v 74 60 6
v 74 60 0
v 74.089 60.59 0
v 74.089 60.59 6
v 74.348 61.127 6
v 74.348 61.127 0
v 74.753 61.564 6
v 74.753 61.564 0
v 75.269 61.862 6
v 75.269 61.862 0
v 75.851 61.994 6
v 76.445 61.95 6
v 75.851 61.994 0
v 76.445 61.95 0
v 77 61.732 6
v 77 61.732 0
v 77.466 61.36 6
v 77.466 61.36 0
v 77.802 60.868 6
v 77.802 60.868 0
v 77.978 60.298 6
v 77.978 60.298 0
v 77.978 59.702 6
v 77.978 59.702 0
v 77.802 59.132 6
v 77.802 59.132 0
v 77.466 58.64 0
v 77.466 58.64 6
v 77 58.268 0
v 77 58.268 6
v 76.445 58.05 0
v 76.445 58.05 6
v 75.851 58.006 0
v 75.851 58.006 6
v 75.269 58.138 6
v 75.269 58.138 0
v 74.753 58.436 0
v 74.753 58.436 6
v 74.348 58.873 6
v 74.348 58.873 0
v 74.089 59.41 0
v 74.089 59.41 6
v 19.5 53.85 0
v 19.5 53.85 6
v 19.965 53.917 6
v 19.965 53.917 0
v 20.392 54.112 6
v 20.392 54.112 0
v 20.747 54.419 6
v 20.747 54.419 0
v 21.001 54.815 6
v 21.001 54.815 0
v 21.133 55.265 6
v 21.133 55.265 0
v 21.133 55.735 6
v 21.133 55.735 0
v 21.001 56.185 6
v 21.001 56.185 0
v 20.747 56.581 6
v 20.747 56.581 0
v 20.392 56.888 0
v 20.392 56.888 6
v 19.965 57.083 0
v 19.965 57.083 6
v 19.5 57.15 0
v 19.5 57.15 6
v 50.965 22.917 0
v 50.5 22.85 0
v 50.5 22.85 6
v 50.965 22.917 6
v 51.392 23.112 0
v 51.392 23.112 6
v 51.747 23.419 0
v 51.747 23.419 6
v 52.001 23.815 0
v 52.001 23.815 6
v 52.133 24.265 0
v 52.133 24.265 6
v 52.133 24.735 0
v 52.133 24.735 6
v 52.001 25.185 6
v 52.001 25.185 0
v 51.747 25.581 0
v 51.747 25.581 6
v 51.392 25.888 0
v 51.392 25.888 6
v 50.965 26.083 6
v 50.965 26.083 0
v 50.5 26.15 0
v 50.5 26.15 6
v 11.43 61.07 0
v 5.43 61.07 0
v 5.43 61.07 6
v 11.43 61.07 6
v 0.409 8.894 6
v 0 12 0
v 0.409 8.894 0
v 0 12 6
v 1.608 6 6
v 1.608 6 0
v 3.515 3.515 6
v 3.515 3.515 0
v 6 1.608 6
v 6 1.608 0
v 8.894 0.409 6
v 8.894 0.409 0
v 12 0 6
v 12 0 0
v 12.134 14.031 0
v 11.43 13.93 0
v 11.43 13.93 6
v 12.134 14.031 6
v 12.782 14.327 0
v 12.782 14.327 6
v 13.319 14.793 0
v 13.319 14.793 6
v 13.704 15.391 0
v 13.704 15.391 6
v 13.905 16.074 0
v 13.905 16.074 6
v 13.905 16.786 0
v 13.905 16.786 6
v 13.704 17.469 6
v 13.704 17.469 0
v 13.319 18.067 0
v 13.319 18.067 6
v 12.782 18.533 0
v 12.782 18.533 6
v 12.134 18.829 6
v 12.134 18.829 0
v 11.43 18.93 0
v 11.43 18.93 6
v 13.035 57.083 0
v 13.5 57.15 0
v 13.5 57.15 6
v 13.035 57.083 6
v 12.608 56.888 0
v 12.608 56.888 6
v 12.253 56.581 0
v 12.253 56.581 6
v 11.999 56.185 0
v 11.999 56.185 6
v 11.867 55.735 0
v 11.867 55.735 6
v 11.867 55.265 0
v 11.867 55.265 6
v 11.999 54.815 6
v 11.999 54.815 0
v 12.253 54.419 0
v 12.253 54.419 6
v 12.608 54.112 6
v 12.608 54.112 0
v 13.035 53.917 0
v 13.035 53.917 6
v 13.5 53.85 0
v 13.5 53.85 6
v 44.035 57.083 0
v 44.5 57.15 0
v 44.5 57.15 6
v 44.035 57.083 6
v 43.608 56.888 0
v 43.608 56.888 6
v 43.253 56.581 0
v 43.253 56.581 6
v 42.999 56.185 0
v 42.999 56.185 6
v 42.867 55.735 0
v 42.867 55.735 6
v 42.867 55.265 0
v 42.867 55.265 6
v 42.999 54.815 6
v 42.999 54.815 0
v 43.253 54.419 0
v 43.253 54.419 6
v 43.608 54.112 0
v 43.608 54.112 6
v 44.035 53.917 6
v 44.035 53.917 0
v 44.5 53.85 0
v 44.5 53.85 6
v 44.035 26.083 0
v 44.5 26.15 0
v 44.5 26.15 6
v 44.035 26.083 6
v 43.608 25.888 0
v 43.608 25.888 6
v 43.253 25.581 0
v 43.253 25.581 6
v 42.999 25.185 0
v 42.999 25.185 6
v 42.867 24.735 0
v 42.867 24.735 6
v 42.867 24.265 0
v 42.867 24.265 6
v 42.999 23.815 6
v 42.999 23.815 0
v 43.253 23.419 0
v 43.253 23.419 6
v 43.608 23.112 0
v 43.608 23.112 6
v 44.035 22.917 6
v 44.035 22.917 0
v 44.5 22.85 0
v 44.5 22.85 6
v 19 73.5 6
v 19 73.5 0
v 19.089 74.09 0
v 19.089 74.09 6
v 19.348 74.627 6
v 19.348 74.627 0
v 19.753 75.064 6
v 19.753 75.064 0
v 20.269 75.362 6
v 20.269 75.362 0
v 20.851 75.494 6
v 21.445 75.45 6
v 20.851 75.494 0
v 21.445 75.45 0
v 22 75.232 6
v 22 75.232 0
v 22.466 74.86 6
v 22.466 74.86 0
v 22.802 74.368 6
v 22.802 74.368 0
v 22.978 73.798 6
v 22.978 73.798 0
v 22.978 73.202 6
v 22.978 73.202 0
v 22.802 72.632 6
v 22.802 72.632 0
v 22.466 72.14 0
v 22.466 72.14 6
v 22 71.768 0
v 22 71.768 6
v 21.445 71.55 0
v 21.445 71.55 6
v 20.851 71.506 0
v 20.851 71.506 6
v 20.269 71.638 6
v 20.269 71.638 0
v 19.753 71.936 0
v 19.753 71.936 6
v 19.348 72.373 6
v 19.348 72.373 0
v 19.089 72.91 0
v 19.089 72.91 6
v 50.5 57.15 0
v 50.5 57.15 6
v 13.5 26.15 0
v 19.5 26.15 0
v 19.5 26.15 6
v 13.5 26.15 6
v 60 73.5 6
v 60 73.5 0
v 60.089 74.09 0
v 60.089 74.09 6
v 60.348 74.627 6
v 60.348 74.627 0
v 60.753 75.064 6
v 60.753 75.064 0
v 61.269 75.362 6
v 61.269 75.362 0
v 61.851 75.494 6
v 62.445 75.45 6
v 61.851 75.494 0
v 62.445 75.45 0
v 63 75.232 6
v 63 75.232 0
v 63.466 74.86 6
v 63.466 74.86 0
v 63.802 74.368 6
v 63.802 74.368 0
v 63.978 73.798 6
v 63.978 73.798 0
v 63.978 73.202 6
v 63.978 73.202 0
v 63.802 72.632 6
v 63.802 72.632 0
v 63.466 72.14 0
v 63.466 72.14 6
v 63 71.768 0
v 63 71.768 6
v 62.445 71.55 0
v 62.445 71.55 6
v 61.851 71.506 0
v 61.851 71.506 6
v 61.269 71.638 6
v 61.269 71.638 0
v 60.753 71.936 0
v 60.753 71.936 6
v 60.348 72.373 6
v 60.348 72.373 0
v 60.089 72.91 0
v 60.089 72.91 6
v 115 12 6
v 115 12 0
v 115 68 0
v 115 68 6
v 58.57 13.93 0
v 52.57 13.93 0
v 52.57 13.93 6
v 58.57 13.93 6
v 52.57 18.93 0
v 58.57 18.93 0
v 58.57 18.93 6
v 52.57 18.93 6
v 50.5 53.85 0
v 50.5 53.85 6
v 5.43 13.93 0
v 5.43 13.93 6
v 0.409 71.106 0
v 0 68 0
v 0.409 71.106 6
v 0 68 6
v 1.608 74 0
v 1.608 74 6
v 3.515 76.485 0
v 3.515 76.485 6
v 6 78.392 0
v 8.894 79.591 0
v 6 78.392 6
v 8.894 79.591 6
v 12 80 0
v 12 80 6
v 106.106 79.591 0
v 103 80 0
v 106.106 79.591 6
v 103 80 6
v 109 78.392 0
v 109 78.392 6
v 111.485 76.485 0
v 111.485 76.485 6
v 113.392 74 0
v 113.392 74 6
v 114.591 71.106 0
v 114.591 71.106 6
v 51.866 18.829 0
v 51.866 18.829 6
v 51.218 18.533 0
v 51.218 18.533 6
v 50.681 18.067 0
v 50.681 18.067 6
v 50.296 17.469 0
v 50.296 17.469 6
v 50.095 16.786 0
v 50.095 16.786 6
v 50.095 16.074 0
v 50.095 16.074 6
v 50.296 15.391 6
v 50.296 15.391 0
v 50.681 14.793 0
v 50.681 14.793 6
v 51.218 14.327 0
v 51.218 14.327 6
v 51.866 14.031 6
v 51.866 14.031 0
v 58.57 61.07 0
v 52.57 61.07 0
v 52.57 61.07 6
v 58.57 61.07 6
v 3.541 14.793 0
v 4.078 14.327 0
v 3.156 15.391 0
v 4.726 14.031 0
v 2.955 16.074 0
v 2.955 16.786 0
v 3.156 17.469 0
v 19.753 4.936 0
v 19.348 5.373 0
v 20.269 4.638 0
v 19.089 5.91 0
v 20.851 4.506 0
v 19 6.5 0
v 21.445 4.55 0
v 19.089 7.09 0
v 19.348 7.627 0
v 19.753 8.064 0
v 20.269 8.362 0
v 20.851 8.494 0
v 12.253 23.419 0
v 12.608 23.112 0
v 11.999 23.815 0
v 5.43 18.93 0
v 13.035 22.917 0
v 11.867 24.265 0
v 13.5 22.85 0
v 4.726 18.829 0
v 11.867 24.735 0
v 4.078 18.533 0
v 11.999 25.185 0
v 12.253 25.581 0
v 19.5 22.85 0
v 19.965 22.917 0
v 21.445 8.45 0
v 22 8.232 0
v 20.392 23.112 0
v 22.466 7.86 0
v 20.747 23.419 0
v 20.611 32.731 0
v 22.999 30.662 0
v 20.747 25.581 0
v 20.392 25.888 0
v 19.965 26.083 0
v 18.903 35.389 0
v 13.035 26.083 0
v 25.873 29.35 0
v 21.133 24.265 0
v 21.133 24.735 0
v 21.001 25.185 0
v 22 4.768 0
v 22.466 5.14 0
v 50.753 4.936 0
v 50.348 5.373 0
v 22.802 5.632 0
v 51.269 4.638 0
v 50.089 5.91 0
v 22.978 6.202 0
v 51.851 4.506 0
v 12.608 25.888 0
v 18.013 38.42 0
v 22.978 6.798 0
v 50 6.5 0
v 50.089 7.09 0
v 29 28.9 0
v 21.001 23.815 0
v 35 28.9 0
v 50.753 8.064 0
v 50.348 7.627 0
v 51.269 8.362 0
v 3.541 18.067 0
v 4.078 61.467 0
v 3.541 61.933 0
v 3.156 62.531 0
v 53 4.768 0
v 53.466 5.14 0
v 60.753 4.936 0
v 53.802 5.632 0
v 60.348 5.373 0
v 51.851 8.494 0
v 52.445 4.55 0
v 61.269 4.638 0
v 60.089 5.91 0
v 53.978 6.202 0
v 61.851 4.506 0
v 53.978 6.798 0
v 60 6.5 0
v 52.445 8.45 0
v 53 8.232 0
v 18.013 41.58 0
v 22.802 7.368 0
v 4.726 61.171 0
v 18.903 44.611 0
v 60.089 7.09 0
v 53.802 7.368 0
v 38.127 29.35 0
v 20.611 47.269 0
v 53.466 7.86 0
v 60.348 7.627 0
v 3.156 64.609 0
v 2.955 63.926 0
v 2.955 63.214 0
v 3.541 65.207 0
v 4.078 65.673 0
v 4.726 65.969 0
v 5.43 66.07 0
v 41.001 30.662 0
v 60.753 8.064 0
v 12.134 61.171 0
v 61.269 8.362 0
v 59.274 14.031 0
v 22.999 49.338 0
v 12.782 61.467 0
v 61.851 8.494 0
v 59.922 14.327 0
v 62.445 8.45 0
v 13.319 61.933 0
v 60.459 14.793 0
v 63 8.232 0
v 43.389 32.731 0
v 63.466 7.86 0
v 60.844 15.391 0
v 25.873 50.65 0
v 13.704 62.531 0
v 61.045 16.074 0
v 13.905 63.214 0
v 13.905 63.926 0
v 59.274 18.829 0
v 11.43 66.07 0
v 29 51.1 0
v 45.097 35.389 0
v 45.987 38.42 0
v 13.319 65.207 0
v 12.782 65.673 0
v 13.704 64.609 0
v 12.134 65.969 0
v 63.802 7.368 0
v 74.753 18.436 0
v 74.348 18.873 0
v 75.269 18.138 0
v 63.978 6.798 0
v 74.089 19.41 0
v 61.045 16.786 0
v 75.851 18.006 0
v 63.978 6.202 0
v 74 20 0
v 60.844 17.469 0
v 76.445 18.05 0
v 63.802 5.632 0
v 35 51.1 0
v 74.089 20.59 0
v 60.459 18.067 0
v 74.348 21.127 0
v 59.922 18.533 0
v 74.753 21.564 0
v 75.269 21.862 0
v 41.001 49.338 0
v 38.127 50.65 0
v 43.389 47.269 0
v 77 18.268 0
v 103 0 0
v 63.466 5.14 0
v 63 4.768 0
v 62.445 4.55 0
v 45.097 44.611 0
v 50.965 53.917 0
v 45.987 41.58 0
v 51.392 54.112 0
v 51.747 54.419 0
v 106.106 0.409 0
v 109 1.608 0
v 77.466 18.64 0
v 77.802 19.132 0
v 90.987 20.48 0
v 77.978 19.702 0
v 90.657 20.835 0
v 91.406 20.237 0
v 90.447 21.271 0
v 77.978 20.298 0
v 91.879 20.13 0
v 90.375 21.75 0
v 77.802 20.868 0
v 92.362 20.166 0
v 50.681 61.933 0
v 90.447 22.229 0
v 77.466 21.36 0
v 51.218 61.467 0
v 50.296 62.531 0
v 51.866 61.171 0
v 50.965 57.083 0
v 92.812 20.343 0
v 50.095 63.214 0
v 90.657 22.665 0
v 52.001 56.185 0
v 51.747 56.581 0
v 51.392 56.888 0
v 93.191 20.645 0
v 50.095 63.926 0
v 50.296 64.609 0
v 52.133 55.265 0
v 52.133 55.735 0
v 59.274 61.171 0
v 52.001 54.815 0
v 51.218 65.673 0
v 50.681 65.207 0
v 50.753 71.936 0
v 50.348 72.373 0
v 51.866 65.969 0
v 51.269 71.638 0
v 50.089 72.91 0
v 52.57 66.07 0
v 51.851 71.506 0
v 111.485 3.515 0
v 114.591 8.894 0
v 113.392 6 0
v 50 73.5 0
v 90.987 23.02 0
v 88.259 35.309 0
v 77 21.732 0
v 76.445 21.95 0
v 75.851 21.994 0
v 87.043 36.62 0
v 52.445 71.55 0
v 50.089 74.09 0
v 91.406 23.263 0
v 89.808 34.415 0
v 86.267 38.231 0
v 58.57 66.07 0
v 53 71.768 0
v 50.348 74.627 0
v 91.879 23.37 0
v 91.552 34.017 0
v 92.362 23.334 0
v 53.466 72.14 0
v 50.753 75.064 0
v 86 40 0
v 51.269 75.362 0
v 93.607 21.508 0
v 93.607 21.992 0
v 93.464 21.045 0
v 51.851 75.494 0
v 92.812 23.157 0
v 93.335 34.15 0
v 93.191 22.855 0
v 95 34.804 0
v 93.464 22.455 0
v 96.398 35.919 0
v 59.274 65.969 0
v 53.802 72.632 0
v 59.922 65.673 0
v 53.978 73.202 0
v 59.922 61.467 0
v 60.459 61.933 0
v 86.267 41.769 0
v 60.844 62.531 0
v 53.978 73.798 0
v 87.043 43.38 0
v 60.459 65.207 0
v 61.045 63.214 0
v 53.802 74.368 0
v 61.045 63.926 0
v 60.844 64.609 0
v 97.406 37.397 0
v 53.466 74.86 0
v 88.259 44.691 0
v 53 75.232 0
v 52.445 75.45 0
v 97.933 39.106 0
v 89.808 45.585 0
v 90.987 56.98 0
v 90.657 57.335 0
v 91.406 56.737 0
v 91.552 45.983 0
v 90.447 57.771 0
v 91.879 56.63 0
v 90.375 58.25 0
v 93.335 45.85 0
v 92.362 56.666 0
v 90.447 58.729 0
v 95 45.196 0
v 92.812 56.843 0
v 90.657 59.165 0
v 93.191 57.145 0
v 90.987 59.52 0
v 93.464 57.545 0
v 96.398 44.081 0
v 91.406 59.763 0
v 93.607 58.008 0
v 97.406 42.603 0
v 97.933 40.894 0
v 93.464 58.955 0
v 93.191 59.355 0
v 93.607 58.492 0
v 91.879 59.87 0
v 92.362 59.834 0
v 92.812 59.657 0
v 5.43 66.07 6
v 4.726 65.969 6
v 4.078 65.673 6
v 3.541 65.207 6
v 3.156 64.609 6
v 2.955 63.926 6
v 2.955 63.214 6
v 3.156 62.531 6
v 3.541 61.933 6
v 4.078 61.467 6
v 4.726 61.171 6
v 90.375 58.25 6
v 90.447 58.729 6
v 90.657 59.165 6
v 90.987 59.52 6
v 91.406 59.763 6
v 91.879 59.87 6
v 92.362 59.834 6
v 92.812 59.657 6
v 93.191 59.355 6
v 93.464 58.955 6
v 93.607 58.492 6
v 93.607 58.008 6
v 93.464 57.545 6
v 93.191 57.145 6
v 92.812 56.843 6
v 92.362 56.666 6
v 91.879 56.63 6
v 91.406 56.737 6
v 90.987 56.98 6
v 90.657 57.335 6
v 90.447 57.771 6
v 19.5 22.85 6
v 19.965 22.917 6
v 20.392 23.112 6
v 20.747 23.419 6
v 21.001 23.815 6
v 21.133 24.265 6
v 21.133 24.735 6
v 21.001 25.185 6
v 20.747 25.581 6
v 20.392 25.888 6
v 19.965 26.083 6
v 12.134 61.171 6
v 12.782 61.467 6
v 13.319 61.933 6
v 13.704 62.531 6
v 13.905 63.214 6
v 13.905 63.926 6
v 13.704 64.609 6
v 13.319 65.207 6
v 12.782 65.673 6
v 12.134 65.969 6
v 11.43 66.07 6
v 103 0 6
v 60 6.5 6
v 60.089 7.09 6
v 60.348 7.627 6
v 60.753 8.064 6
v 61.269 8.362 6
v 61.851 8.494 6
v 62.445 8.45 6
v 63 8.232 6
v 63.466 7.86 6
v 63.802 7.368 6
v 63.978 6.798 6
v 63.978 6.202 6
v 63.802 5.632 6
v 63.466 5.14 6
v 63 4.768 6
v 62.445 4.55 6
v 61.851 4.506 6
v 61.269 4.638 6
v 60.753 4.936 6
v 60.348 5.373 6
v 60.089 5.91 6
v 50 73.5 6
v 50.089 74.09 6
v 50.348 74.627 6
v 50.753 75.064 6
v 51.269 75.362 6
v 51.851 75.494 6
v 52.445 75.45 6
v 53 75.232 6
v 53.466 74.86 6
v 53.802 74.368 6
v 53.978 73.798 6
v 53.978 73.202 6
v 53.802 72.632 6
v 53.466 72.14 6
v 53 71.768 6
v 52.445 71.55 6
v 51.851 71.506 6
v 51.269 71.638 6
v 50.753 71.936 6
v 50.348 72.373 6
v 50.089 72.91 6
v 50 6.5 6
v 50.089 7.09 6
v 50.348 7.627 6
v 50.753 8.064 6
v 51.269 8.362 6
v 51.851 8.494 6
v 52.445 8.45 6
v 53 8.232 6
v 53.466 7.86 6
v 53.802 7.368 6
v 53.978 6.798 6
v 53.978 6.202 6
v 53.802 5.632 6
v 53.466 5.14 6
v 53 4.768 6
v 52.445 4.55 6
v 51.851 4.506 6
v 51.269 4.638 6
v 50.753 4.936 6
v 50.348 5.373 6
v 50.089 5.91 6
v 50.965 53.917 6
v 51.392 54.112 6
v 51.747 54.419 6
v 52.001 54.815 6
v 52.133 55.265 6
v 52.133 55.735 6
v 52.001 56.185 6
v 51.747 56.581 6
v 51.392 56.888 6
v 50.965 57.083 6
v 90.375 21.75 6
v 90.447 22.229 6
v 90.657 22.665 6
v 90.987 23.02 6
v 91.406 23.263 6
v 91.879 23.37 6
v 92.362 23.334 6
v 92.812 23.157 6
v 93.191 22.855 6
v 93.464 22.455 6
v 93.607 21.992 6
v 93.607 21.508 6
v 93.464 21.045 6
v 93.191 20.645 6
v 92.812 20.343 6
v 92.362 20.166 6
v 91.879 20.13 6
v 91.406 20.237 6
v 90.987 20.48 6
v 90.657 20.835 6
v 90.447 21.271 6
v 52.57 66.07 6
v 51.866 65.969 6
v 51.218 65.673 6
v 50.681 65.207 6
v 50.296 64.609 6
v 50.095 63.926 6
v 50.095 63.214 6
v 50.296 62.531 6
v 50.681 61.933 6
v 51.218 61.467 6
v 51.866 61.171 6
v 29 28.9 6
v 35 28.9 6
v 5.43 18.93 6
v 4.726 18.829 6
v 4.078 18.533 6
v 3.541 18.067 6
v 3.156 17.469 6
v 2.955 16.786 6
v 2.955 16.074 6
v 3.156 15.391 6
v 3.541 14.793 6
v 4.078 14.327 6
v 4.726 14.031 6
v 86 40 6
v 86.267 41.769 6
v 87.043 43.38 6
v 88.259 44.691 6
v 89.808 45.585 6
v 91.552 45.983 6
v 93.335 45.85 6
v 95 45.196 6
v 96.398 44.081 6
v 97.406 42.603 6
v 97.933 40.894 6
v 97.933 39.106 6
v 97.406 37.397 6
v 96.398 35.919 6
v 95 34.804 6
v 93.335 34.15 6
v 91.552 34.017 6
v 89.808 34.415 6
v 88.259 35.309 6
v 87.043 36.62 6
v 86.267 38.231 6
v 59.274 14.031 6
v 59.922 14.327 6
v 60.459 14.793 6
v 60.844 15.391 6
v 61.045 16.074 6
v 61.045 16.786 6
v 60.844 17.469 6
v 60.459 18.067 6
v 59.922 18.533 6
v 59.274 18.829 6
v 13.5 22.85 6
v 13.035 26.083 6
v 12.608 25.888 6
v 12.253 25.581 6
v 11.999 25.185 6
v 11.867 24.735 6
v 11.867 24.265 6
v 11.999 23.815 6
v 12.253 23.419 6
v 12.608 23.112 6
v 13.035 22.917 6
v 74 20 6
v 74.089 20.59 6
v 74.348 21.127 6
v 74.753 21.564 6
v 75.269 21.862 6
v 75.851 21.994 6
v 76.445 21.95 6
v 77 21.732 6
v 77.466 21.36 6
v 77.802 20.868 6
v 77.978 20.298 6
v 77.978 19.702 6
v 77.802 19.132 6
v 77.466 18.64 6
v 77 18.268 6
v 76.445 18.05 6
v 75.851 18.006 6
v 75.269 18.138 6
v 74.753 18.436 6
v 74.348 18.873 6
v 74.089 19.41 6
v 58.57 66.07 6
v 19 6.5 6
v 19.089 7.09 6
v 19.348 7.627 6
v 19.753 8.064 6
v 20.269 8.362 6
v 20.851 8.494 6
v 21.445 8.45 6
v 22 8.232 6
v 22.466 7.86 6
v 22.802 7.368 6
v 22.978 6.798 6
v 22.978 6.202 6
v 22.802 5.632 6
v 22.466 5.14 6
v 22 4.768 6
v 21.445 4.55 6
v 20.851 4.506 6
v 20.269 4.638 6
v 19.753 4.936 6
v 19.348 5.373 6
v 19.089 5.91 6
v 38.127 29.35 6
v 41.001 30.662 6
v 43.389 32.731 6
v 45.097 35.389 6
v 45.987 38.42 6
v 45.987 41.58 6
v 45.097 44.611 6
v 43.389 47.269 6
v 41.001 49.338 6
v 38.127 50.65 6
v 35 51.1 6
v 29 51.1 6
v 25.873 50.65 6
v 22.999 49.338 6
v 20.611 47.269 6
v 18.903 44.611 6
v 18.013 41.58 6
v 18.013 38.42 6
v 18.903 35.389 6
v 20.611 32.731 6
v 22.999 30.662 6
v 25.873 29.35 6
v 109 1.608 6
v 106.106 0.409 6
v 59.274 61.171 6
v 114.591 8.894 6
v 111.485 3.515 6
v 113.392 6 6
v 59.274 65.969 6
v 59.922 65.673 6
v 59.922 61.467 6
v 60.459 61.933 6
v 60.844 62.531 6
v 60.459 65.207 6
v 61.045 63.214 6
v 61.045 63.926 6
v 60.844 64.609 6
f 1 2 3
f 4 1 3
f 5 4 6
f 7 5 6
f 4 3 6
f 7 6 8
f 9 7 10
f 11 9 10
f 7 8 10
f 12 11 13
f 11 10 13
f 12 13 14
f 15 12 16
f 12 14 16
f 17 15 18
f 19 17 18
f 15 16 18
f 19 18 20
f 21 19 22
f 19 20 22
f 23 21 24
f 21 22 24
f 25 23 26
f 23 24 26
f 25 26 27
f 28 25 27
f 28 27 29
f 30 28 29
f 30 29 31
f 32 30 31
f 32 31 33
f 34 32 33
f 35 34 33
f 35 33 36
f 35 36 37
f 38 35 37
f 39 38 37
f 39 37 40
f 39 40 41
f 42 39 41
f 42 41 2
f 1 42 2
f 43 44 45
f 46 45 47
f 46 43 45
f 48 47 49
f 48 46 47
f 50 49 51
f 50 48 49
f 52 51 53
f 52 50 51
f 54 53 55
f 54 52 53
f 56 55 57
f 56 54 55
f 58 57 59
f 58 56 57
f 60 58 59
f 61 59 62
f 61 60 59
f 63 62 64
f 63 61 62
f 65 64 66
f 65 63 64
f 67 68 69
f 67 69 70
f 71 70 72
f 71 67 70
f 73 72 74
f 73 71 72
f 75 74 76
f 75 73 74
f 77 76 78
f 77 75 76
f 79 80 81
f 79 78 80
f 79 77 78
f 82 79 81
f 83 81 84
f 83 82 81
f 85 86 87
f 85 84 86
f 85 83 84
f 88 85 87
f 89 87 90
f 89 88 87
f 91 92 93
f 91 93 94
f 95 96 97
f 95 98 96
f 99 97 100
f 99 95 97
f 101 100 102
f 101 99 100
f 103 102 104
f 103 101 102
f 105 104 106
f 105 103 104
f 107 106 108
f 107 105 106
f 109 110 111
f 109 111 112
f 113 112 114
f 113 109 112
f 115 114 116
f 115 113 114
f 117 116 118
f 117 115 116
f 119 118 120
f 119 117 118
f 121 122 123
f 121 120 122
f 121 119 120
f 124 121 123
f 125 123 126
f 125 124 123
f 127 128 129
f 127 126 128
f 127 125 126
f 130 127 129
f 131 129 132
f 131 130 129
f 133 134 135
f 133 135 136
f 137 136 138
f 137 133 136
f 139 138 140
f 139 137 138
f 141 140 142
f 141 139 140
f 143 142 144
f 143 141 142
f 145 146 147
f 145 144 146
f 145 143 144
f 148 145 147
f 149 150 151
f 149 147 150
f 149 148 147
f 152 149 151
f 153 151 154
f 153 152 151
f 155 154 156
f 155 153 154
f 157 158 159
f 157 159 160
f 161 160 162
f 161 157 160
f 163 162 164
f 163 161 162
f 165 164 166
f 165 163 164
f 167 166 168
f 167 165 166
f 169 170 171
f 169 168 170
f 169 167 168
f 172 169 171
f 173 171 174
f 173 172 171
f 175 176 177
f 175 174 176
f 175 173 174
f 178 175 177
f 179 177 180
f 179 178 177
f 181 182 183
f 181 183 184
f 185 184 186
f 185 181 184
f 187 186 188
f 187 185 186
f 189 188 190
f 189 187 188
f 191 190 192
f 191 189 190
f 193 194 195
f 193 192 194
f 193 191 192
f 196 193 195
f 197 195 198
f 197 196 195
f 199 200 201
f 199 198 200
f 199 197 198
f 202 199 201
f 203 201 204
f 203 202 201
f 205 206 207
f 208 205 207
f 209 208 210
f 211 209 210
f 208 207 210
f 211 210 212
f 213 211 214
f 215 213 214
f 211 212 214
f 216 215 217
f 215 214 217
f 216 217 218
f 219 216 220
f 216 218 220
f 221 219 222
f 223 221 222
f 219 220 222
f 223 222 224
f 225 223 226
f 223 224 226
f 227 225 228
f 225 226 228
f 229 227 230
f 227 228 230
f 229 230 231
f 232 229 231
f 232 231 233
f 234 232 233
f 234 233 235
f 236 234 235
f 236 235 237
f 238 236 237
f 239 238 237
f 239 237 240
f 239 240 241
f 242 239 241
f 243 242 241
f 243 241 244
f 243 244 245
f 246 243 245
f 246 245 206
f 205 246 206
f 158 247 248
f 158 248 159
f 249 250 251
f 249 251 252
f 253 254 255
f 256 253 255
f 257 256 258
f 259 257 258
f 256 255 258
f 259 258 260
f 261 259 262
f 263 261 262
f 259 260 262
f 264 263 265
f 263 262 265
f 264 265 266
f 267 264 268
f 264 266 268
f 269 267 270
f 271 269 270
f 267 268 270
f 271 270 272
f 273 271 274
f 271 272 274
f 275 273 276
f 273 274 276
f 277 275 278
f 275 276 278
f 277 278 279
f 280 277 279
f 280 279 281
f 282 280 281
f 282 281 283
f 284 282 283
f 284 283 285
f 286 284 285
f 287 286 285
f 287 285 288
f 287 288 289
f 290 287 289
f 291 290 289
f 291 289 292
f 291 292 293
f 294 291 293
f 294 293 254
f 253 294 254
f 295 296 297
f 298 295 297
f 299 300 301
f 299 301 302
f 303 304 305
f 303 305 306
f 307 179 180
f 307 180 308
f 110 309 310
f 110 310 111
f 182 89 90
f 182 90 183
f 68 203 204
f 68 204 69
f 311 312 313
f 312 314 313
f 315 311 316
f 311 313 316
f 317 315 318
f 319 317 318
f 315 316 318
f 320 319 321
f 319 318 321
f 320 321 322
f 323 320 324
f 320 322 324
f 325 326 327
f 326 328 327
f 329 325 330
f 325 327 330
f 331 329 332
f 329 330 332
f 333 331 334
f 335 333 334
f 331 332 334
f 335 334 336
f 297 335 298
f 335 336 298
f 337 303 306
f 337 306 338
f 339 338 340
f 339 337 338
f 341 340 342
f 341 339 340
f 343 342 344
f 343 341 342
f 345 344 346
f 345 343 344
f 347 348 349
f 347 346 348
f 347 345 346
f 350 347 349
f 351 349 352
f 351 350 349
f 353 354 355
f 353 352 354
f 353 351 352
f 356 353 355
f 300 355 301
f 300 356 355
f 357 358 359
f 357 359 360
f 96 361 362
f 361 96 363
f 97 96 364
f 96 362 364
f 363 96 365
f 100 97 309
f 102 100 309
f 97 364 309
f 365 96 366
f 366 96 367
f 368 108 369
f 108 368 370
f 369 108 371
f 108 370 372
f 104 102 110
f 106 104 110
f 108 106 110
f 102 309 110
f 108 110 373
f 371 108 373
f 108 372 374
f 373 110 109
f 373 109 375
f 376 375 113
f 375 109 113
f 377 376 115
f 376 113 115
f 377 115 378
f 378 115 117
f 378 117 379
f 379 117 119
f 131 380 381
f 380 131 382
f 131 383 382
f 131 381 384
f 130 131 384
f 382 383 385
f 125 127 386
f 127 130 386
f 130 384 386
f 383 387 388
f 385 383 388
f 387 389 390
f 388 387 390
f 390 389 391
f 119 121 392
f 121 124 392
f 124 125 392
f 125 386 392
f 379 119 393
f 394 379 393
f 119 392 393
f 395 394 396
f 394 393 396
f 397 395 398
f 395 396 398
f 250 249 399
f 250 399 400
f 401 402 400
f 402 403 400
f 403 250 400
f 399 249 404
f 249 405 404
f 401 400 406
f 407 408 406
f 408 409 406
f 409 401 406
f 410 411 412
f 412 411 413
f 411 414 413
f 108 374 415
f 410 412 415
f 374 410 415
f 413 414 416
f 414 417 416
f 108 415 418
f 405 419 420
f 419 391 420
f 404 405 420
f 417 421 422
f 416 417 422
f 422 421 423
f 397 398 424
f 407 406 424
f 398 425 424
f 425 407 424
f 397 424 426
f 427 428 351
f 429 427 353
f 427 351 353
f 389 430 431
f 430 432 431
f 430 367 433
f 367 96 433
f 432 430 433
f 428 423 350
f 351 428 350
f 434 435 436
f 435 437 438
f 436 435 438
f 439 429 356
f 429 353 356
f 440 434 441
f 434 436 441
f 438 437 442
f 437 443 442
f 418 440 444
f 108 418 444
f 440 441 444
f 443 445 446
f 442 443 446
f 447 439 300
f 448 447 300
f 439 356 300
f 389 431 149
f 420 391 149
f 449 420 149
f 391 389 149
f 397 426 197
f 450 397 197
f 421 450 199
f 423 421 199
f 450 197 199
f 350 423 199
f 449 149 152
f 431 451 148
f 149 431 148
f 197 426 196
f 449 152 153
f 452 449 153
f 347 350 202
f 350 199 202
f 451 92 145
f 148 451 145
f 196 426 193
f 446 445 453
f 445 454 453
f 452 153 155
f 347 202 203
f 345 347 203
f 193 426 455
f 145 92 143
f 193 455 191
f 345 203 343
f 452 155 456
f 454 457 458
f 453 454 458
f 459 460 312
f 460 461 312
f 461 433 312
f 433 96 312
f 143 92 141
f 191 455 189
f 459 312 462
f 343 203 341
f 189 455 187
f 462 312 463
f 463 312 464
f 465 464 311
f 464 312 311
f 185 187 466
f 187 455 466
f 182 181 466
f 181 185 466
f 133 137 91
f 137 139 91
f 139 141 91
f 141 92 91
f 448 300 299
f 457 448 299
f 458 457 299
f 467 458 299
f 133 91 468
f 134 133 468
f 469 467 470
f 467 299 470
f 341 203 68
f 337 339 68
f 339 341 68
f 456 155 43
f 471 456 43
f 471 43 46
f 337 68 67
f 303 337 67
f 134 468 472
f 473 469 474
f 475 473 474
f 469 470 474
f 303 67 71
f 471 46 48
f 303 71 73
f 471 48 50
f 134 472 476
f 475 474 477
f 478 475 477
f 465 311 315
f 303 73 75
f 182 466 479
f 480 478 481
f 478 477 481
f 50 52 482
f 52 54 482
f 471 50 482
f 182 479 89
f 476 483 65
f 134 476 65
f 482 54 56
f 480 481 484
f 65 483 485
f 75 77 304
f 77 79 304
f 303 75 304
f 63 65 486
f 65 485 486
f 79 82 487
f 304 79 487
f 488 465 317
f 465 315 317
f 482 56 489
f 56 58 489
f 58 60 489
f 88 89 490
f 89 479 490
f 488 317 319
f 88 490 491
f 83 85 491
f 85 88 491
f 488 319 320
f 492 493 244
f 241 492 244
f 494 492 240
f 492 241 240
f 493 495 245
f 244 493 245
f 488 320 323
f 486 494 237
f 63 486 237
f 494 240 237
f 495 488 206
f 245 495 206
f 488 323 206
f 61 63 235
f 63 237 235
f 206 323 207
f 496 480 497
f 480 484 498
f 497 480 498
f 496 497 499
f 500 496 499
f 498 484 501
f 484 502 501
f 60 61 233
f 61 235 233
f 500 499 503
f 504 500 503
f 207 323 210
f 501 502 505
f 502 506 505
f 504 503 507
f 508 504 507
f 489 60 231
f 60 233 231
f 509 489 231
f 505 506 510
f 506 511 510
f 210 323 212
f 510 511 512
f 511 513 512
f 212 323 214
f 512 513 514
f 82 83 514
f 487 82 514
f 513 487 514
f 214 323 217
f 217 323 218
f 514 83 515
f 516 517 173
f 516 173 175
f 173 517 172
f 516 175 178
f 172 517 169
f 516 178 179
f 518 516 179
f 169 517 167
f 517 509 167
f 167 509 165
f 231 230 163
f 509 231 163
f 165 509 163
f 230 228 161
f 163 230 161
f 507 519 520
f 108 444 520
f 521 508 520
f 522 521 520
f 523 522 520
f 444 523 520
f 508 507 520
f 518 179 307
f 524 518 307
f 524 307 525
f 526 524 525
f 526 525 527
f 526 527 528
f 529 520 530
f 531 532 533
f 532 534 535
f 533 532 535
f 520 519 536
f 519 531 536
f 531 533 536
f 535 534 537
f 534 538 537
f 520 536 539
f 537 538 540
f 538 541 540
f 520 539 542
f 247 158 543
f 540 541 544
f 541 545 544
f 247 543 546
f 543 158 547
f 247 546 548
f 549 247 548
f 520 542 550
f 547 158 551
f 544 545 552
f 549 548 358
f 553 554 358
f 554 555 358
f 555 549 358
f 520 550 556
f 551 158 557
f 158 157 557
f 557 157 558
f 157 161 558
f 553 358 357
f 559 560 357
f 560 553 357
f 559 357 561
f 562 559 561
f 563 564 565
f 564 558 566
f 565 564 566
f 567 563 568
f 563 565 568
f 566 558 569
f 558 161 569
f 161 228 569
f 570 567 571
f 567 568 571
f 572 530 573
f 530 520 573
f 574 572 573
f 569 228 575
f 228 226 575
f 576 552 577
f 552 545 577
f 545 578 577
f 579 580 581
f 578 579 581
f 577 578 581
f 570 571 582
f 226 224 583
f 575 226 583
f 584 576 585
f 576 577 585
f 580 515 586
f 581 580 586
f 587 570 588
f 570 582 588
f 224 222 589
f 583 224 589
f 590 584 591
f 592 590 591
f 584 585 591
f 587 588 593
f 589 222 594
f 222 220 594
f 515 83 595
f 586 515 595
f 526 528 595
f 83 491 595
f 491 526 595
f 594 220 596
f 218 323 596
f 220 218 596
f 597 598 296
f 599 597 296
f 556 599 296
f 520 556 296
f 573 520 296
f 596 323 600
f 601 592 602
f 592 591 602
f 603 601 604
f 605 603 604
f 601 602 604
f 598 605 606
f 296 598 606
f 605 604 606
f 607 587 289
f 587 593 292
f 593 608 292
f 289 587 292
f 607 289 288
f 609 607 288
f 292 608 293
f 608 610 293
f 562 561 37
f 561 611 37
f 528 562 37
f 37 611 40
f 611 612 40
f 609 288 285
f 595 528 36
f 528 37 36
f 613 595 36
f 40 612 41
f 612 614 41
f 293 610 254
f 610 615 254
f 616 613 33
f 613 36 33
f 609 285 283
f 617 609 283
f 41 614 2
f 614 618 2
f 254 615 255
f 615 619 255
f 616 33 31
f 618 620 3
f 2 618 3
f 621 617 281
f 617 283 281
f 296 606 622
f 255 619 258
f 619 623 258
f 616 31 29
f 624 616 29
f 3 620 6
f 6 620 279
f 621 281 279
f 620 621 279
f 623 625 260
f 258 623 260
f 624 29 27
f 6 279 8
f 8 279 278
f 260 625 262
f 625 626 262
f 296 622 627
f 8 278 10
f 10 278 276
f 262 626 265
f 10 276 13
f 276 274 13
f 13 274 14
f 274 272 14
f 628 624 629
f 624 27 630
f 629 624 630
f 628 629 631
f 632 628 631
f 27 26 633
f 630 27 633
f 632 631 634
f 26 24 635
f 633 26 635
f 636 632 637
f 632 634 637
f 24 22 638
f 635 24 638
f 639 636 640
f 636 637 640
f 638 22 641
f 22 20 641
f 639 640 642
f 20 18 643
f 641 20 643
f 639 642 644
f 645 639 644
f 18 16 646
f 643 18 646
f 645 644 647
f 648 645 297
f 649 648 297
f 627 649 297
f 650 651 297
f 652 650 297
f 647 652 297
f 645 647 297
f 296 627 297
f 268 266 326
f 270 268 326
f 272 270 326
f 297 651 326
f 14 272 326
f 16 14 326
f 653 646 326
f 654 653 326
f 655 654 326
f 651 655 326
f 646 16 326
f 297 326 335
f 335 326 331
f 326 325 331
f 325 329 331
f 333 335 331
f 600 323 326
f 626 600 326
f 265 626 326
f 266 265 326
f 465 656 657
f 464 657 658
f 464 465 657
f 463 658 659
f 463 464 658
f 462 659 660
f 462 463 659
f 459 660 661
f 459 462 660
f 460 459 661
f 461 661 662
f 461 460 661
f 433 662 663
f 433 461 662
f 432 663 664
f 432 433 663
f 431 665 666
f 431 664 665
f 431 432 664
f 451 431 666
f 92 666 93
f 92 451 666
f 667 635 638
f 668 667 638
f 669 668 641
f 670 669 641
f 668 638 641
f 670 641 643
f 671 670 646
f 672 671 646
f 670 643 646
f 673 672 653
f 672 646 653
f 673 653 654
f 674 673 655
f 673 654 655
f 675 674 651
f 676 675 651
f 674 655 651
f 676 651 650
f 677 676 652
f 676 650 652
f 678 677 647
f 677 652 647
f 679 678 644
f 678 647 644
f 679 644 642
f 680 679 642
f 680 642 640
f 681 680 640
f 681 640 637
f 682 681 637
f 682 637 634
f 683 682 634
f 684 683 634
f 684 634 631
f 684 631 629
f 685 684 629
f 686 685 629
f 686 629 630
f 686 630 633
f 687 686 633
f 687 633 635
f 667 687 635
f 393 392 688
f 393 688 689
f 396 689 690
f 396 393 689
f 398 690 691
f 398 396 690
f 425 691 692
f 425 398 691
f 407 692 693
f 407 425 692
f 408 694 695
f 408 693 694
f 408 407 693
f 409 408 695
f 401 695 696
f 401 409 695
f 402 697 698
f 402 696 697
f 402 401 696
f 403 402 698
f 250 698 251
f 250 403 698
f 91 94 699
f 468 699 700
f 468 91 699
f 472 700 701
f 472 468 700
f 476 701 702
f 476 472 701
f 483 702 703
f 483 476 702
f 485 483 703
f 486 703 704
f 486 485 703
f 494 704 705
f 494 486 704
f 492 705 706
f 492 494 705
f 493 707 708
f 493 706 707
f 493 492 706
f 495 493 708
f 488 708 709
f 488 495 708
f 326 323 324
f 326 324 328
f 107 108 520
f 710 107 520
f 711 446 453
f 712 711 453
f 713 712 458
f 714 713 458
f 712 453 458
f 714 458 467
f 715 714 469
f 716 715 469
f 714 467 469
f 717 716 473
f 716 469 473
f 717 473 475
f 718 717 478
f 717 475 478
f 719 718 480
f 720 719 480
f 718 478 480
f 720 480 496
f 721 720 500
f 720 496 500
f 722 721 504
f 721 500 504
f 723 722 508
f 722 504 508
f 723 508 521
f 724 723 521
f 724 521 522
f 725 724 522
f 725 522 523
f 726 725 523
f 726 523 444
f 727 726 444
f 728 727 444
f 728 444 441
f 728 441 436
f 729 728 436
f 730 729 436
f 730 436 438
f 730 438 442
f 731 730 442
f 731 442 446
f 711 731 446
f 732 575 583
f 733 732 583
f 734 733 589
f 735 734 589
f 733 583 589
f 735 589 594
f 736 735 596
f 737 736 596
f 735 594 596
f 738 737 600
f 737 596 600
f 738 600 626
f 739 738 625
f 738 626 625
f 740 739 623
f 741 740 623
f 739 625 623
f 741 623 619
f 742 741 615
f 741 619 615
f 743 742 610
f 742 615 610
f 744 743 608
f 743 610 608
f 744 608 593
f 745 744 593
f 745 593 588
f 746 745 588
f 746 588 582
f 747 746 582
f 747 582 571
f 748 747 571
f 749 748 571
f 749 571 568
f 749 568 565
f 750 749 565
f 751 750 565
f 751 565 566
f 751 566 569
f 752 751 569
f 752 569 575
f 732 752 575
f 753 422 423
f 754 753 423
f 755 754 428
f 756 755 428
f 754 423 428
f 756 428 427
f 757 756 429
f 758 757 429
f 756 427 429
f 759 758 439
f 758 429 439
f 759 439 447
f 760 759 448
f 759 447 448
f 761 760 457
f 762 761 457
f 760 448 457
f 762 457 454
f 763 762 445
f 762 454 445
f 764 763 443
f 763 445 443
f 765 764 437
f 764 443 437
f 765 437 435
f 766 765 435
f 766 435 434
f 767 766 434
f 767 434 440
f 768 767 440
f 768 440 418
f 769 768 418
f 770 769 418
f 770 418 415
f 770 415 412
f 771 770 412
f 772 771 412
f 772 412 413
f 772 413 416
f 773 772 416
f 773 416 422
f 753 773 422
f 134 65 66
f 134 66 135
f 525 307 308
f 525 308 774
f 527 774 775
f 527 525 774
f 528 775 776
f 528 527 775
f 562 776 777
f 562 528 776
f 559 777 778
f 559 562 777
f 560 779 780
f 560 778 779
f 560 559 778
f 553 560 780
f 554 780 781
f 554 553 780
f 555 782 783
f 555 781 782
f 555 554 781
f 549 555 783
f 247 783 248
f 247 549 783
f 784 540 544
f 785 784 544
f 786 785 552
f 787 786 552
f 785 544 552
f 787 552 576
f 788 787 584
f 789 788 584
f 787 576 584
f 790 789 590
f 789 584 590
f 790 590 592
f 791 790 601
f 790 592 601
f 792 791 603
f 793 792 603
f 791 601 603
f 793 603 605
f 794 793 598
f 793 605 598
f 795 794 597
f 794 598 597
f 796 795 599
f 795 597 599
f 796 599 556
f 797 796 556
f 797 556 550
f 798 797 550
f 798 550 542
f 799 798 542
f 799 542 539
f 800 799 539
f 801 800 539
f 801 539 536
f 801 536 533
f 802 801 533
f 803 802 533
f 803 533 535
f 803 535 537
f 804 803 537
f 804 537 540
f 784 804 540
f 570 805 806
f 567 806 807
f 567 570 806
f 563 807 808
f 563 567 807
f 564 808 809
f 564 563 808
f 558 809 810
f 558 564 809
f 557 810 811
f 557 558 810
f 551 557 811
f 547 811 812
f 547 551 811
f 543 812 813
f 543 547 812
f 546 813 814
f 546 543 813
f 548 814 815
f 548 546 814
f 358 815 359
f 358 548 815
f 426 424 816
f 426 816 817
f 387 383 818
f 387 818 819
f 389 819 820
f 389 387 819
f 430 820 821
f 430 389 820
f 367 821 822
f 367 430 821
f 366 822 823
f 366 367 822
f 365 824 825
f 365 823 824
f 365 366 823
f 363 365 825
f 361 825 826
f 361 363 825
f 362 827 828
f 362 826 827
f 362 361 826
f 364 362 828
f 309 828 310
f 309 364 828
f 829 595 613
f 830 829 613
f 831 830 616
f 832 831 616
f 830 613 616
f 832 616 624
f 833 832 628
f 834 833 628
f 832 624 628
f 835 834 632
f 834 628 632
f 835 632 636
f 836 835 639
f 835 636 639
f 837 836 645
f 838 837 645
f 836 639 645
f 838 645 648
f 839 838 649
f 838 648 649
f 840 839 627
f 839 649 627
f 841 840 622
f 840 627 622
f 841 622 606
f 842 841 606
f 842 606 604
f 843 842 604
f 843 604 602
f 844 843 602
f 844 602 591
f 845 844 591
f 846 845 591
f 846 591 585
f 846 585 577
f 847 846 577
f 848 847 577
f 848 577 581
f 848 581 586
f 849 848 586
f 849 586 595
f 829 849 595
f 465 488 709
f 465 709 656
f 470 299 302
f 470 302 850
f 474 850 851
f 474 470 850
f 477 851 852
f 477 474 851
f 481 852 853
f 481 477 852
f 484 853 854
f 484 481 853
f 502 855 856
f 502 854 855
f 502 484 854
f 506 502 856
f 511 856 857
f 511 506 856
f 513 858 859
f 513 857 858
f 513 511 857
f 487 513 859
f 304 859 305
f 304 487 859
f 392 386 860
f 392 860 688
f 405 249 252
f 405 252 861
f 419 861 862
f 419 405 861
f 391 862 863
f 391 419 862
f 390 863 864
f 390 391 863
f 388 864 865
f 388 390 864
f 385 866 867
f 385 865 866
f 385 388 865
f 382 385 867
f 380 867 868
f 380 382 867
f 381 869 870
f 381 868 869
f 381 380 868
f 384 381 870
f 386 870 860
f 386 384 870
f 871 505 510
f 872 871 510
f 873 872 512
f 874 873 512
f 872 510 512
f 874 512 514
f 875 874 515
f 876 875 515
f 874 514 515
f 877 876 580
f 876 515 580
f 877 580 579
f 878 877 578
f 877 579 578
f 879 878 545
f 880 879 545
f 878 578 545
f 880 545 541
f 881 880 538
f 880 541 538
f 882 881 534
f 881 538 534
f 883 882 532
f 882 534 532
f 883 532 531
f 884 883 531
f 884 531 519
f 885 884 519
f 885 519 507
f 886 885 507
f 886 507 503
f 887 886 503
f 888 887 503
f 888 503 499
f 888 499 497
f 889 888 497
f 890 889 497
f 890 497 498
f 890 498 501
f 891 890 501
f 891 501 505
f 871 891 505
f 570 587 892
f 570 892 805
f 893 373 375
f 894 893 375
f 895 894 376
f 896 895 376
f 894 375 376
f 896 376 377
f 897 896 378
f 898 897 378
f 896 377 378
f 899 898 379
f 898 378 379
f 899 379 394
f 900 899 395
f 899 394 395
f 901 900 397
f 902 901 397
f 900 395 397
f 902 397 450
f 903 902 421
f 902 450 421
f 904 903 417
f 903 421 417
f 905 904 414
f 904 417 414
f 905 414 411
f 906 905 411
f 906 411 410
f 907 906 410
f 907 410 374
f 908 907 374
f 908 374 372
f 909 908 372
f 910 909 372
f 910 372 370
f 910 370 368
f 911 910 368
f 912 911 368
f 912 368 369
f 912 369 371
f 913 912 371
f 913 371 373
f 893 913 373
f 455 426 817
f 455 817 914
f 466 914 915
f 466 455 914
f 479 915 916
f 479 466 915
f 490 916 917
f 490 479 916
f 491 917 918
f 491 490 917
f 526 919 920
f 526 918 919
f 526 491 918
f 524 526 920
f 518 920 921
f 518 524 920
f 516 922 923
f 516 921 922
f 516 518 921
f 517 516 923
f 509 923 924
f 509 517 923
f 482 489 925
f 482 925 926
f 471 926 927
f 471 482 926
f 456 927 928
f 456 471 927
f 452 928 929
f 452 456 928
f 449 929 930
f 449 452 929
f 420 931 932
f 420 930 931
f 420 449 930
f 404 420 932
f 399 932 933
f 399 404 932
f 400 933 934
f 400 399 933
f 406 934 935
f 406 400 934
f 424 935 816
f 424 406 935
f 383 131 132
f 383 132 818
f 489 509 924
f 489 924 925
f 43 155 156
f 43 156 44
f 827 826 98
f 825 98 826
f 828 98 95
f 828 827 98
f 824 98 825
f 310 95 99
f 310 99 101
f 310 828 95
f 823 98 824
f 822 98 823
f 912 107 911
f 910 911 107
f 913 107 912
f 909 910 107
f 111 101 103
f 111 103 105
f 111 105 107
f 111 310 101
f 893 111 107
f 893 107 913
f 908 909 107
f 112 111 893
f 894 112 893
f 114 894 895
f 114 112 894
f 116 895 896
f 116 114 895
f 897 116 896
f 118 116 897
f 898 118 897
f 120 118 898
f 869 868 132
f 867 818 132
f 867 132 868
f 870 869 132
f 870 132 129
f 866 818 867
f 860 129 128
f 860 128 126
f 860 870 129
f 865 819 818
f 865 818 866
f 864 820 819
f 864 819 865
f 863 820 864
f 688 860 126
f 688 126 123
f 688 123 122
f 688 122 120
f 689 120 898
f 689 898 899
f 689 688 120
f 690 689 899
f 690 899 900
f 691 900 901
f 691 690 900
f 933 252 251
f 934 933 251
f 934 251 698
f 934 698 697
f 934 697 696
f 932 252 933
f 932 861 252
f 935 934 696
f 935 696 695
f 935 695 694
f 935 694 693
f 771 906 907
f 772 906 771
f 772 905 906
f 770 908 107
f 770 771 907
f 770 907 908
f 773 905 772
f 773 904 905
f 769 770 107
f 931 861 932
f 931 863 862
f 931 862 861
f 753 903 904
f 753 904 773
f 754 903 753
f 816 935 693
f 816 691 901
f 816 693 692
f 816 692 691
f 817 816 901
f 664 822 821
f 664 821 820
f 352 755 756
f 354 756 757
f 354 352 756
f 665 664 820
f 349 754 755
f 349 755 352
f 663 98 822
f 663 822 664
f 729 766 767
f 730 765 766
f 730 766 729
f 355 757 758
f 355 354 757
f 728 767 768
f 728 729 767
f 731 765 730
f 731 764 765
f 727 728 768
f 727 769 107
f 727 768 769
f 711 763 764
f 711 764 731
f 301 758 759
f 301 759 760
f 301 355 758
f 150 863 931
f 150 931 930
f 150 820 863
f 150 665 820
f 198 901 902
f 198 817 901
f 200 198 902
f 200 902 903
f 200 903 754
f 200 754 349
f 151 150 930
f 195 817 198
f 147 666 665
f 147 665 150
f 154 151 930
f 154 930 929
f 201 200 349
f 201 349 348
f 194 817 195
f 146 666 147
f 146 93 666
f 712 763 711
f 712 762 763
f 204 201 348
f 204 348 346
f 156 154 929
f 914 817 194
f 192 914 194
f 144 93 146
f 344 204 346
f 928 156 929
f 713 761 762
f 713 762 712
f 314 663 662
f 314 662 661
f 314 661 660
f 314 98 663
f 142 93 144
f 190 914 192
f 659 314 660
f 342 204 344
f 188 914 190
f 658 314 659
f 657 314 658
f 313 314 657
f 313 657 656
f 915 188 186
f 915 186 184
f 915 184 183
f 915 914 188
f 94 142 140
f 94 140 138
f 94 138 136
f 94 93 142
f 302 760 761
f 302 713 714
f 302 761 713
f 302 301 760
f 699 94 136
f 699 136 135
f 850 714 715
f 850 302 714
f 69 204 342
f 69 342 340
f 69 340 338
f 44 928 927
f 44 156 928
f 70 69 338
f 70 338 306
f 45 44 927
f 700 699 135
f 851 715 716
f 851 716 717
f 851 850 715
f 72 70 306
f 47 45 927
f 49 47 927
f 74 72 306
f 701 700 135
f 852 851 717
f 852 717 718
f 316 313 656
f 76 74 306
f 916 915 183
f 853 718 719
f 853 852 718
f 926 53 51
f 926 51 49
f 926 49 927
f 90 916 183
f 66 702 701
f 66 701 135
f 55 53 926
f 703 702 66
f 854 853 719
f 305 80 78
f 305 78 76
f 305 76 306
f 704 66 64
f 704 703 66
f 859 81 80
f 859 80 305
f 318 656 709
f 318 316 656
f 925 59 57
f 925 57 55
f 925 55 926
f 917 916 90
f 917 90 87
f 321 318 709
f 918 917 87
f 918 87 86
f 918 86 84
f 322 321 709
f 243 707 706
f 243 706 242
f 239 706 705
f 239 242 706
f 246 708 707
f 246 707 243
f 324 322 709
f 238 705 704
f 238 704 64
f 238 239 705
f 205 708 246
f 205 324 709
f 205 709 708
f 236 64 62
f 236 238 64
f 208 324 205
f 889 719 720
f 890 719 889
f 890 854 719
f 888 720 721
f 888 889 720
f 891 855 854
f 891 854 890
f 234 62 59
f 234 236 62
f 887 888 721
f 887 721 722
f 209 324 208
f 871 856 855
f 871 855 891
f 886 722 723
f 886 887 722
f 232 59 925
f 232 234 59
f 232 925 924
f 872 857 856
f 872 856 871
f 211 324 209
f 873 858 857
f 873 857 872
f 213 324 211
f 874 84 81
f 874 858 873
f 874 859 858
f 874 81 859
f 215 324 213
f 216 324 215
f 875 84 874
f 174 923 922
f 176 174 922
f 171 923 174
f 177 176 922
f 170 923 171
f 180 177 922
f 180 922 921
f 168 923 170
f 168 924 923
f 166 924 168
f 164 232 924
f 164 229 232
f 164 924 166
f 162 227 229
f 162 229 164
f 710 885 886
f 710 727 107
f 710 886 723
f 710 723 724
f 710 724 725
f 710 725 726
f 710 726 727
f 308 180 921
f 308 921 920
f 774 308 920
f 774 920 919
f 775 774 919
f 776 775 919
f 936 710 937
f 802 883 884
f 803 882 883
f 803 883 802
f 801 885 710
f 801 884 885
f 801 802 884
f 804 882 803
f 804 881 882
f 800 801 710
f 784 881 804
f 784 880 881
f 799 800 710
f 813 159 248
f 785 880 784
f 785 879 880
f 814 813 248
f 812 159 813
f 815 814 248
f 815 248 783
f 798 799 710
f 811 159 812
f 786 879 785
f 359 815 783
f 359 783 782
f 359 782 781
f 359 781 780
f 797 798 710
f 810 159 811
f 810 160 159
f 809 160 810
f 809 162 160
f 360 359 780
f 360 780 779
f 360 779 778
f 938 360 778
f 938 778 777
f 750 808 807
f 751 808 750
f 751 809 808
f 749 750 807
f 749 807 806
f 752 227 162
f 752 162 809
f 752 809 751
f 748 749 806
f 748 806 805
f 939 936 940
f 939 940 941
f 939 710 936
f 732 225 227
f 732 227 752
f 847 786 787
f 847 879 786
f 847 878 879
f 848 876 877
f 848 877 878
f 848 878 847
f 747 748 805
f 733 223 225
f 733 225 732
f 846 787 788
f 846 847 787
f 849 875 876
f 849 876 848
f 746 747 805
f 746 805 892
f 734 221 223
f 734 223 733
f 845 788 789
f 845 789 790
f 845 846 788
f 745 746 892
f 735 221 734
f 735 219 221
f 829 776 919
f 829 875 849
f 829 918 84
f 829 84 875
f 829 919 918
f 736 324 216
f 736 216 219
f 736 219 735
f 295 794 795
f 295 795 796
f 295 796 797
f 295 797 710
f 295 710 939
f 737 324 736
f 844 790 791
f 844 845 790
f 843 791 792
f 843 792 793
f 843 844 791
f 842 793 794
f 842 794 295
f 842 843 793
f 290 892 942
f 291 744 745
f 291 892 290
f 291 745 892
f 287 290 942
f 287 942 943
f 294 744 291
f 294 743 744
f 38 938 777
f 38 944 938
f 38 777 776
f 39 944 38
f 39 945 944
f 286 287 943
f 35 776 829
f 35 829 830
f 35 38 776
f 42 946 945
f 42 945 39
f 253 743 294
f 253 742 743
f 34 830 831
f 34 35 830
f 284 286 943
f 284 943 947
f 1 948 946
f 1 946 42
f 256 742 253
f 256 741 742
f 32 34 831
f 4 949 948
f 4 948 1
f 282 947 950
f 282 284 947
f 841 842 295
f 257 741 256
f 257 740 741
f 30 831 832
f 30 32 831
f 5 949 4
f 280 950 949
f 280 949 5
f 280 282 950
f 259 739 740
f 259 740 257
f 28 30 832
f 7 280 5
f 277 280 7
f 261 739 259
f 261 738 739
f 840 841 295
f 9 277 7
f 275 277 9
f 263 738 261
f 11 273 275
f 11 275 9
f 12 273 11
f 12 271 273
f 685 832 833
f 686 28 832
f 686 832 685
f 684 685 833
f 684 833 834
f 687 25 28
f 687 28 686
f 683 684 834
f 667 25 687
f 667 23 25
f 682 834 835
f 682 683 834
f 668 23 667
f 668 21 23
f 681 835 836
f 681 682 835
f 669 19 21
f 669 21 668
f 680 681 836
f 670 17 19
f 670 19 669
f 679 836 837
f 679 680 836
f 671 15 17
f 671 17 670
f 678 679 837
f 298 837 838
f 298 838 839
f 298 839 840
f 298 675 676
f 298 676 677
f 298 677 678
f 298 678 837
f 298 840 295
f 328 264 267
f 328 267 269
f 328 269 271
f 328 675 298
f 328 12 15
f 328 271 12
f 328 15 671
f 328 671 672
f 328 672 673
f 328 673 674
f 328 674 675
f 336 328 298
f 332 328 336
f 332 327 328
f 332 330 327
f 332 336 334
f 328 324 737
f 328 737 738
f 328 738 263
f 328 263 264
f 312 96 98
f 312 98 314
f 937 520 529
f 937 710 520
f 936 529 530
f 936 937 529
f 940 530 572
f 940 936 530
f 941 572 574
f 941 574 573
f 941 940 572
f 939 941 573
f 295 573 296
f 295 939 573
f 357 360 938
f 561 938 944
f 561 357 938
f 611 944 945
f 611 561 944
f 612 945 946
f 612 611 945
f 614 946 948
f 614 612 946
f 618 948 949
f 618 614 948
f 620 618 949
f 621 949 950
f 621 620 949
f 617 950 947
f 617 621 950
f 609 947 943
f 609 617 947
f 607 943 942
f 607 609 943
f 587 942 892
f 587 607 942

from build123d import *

# Parameters (mm, degrees)
CROQUIS1_W              = 115
CROQUIS1_H              = 80
SALIENTE_EXTRUIR1_DEPTH = 6
CROQUIS2_R              = 6
CROQUIS2_R_2            = 1.625
CROQUIS2_R_3            = 2
CORTAR_EXTRUIR1_DEPTH   = 7
REDONDEO1_R             = 12
CROQUIS3_R              = 2
CORTAR_EXTRUIR2_DEPTH   = 7


with BuildPart() as part:
    # Croquis1 → Saliente-Extruir1 (new body)
    with BuildSketch(Plane.XY):
        with Locations((57.5, 40)):
            Rectangle(CROQUIS1_W, CROQUIS1_H)
    extrude(amount=SALIENTE_EXTRUIR1_DEPTH)

    # Croquis2 → Cortar-Extruir1 (cut, through all)
    with BuildSketch(Plane(origin=(0, 0, 0), x_dir=(-1, 0, 0), z_dir=(0, 0, -1))):
        with Locations((-92, 40)):
            Circle(CROQUIS2_R)
        with Locations((-92, 21.75)):
            Circle(CROQUIS2_R_2)
        with Locations((-92, 58.25)):
            Circle(CROQUIS2_R_2)
        with Locations((-76, 20)):
            Circle(CROQUIS2_R_3)
        with Locations((-76, 60)):
            Circle(CROQUIS2_R_3)
        with BuildLine():
            Line((-29, 28.9), (-35, 28.9))
            ThreePointArc((-35, 28.9), (-46.1, 40), (-35, 51.1))
            Line((-35, 51.1), (-29, 51.1))
            ThreePointArc((-29, 51.1), (-17.9, 40), (-29, 28.9))
        make_face()
        with BuildLine():
            Line((-13.5, 22.85), (-19.5, 22.85))
            ThreePointArc((-19.5, 22.85), (-21.15, 24.5), (-19.5, 26.15))
            Line((-19.5, 26.15), (-13.5, 26.15))
            ThreePointArc((-13.5, 26.15), (-11.85, 24.5), (-13.5, 22.85))
        make_face()
        with BuildLine():
            Line((-44.5, 53.85), (-50.5, 53.85))
            ThreePointArc((-50.5, 53.85), (-52.15, 55.5), (-50.5, 57.15))
            Line((-50.5, 57.15), (-44.5, 57.15))
            ThreePointArc((-44.5, 57.15), (-42.85, 55.5), (-44.5, 53.85))
        make_face()
        with BuildLine():
            Line((-44.5, 22.85), (-50.5, 22.85))
            ThreePointArc((-50.5, 22.85), (-52.15, 24.5), (-50.5, 26.15))
            Line((-50.5, 26.15), (-44.5, 26.15))
            ThreePointArc((-44.5, 26.15), (-42.85, 24.5), (-44.5, 22.85))
        make_face()
        with BuildLine():
            Line((-13.5, 53.85), (-19.5, 53.85))
            ThreePointArc((-19.5, 53.85), (-21.15, 55.5), (-19.5, 57.15))
            Line((-19.5, 57.15), (-13.5, 57.15))
            ThreePointArc((-13.5, 57.15), (-11.85, 55.5), (-13.5, 53.85))
        make_face()
        with BuildLine():
            Line((-52.57, 13.93), (-58.57, 13.93))
            ThreePointArc((-58.57, 13.93), (-61.07, 16.43), (-58.57, 18.93))
            Line((-58.57, 18.93), (-52.57, 18.93))
            ThreePointArc((-52.57, 18.93), (-50.07, 16.43), (-52.57, 13.93))
        make_face()
        with BuildLine():
            Line((-5.43, 13.93), (-11.43, 13.93))
            ThreePointArc((-11.43, 13.93), (-13.93, 16.43), (-11.43, 18.93))
            Line((-11.43, 18.93), (-5.43, 18.93))
            ThreePointArc((-5.43, 18.93), (-2.93, 16.43), (-5.43, 13.93))
        make_face()
        with BuildLine():
            Line((-52.57, 61.07), (-58.57, 61.07))
            ThreePointArc((-58.57, 61.07), (-61.07, 63.57), (-58.57, 66.07))
            Line((-58.57, 66.07), (-52.57, 66.07))
            ThreePointArc((-52.57, 66.07), (-50.07, 63.57), (-52.57, 61.07))
        make_face()
        with BuildLine():
            Line((-5.43, 61.07), (-11.43, 61.07))
            ThreePointArc((-11.43, 61.07), (-13.93, 63.57), (-11.43, 66.07))
            Line((-11.43, 66.07), (-5.43, 66.07))
            ThreePointArc((-5.43, 66.07), (-2.93, 63.57), (-5.43, 61.07))
        make_face()
    extrude(amount=-CORTAR_EXTRUIR1_DEPTH, mode=Mode.SUBTRACT)

    # Redondeo1
    redondeo1_edges = [part.edges().sort_by_distance(p)[0] for p in [
        (0, 80, 3),
        (115, 80, 3),
        (115, 0, 3),
        (0, 0, 3),
    ]]
    fillet(redondeo1_edges, radius=REDONDEO1_R)

    # Croquis3 → Cortar-Extruir2 (cut, through all)
    with BuildSketch(Plane(origin=(0, 0, 0), x_dir=(-1, 0, 0), z_dir=(0, 0, -1))):
        with Locations((-21, 6.5)):
            Circle(CROQUIS3_R)
        with Locations((-62, 6.5)):
            Circle(CROQUIS3_R)
        with Locations((-62, 73.5)):
            Circle(CROQUIS3_R)
        with Locations((-21, 73.5)):
            Circle(CROQUIS3_R)
        with Locations((-52, 6.5)):
            Circle(CROQUIS3_R)
        with Locations((-52, 73.5)):
            Circle(CROQUIS3_R)
    extrude(amount=-CORTAR_EXTRUIR2_DEPTH, mode=Mode.SUBTRACT)


solid = part.part
